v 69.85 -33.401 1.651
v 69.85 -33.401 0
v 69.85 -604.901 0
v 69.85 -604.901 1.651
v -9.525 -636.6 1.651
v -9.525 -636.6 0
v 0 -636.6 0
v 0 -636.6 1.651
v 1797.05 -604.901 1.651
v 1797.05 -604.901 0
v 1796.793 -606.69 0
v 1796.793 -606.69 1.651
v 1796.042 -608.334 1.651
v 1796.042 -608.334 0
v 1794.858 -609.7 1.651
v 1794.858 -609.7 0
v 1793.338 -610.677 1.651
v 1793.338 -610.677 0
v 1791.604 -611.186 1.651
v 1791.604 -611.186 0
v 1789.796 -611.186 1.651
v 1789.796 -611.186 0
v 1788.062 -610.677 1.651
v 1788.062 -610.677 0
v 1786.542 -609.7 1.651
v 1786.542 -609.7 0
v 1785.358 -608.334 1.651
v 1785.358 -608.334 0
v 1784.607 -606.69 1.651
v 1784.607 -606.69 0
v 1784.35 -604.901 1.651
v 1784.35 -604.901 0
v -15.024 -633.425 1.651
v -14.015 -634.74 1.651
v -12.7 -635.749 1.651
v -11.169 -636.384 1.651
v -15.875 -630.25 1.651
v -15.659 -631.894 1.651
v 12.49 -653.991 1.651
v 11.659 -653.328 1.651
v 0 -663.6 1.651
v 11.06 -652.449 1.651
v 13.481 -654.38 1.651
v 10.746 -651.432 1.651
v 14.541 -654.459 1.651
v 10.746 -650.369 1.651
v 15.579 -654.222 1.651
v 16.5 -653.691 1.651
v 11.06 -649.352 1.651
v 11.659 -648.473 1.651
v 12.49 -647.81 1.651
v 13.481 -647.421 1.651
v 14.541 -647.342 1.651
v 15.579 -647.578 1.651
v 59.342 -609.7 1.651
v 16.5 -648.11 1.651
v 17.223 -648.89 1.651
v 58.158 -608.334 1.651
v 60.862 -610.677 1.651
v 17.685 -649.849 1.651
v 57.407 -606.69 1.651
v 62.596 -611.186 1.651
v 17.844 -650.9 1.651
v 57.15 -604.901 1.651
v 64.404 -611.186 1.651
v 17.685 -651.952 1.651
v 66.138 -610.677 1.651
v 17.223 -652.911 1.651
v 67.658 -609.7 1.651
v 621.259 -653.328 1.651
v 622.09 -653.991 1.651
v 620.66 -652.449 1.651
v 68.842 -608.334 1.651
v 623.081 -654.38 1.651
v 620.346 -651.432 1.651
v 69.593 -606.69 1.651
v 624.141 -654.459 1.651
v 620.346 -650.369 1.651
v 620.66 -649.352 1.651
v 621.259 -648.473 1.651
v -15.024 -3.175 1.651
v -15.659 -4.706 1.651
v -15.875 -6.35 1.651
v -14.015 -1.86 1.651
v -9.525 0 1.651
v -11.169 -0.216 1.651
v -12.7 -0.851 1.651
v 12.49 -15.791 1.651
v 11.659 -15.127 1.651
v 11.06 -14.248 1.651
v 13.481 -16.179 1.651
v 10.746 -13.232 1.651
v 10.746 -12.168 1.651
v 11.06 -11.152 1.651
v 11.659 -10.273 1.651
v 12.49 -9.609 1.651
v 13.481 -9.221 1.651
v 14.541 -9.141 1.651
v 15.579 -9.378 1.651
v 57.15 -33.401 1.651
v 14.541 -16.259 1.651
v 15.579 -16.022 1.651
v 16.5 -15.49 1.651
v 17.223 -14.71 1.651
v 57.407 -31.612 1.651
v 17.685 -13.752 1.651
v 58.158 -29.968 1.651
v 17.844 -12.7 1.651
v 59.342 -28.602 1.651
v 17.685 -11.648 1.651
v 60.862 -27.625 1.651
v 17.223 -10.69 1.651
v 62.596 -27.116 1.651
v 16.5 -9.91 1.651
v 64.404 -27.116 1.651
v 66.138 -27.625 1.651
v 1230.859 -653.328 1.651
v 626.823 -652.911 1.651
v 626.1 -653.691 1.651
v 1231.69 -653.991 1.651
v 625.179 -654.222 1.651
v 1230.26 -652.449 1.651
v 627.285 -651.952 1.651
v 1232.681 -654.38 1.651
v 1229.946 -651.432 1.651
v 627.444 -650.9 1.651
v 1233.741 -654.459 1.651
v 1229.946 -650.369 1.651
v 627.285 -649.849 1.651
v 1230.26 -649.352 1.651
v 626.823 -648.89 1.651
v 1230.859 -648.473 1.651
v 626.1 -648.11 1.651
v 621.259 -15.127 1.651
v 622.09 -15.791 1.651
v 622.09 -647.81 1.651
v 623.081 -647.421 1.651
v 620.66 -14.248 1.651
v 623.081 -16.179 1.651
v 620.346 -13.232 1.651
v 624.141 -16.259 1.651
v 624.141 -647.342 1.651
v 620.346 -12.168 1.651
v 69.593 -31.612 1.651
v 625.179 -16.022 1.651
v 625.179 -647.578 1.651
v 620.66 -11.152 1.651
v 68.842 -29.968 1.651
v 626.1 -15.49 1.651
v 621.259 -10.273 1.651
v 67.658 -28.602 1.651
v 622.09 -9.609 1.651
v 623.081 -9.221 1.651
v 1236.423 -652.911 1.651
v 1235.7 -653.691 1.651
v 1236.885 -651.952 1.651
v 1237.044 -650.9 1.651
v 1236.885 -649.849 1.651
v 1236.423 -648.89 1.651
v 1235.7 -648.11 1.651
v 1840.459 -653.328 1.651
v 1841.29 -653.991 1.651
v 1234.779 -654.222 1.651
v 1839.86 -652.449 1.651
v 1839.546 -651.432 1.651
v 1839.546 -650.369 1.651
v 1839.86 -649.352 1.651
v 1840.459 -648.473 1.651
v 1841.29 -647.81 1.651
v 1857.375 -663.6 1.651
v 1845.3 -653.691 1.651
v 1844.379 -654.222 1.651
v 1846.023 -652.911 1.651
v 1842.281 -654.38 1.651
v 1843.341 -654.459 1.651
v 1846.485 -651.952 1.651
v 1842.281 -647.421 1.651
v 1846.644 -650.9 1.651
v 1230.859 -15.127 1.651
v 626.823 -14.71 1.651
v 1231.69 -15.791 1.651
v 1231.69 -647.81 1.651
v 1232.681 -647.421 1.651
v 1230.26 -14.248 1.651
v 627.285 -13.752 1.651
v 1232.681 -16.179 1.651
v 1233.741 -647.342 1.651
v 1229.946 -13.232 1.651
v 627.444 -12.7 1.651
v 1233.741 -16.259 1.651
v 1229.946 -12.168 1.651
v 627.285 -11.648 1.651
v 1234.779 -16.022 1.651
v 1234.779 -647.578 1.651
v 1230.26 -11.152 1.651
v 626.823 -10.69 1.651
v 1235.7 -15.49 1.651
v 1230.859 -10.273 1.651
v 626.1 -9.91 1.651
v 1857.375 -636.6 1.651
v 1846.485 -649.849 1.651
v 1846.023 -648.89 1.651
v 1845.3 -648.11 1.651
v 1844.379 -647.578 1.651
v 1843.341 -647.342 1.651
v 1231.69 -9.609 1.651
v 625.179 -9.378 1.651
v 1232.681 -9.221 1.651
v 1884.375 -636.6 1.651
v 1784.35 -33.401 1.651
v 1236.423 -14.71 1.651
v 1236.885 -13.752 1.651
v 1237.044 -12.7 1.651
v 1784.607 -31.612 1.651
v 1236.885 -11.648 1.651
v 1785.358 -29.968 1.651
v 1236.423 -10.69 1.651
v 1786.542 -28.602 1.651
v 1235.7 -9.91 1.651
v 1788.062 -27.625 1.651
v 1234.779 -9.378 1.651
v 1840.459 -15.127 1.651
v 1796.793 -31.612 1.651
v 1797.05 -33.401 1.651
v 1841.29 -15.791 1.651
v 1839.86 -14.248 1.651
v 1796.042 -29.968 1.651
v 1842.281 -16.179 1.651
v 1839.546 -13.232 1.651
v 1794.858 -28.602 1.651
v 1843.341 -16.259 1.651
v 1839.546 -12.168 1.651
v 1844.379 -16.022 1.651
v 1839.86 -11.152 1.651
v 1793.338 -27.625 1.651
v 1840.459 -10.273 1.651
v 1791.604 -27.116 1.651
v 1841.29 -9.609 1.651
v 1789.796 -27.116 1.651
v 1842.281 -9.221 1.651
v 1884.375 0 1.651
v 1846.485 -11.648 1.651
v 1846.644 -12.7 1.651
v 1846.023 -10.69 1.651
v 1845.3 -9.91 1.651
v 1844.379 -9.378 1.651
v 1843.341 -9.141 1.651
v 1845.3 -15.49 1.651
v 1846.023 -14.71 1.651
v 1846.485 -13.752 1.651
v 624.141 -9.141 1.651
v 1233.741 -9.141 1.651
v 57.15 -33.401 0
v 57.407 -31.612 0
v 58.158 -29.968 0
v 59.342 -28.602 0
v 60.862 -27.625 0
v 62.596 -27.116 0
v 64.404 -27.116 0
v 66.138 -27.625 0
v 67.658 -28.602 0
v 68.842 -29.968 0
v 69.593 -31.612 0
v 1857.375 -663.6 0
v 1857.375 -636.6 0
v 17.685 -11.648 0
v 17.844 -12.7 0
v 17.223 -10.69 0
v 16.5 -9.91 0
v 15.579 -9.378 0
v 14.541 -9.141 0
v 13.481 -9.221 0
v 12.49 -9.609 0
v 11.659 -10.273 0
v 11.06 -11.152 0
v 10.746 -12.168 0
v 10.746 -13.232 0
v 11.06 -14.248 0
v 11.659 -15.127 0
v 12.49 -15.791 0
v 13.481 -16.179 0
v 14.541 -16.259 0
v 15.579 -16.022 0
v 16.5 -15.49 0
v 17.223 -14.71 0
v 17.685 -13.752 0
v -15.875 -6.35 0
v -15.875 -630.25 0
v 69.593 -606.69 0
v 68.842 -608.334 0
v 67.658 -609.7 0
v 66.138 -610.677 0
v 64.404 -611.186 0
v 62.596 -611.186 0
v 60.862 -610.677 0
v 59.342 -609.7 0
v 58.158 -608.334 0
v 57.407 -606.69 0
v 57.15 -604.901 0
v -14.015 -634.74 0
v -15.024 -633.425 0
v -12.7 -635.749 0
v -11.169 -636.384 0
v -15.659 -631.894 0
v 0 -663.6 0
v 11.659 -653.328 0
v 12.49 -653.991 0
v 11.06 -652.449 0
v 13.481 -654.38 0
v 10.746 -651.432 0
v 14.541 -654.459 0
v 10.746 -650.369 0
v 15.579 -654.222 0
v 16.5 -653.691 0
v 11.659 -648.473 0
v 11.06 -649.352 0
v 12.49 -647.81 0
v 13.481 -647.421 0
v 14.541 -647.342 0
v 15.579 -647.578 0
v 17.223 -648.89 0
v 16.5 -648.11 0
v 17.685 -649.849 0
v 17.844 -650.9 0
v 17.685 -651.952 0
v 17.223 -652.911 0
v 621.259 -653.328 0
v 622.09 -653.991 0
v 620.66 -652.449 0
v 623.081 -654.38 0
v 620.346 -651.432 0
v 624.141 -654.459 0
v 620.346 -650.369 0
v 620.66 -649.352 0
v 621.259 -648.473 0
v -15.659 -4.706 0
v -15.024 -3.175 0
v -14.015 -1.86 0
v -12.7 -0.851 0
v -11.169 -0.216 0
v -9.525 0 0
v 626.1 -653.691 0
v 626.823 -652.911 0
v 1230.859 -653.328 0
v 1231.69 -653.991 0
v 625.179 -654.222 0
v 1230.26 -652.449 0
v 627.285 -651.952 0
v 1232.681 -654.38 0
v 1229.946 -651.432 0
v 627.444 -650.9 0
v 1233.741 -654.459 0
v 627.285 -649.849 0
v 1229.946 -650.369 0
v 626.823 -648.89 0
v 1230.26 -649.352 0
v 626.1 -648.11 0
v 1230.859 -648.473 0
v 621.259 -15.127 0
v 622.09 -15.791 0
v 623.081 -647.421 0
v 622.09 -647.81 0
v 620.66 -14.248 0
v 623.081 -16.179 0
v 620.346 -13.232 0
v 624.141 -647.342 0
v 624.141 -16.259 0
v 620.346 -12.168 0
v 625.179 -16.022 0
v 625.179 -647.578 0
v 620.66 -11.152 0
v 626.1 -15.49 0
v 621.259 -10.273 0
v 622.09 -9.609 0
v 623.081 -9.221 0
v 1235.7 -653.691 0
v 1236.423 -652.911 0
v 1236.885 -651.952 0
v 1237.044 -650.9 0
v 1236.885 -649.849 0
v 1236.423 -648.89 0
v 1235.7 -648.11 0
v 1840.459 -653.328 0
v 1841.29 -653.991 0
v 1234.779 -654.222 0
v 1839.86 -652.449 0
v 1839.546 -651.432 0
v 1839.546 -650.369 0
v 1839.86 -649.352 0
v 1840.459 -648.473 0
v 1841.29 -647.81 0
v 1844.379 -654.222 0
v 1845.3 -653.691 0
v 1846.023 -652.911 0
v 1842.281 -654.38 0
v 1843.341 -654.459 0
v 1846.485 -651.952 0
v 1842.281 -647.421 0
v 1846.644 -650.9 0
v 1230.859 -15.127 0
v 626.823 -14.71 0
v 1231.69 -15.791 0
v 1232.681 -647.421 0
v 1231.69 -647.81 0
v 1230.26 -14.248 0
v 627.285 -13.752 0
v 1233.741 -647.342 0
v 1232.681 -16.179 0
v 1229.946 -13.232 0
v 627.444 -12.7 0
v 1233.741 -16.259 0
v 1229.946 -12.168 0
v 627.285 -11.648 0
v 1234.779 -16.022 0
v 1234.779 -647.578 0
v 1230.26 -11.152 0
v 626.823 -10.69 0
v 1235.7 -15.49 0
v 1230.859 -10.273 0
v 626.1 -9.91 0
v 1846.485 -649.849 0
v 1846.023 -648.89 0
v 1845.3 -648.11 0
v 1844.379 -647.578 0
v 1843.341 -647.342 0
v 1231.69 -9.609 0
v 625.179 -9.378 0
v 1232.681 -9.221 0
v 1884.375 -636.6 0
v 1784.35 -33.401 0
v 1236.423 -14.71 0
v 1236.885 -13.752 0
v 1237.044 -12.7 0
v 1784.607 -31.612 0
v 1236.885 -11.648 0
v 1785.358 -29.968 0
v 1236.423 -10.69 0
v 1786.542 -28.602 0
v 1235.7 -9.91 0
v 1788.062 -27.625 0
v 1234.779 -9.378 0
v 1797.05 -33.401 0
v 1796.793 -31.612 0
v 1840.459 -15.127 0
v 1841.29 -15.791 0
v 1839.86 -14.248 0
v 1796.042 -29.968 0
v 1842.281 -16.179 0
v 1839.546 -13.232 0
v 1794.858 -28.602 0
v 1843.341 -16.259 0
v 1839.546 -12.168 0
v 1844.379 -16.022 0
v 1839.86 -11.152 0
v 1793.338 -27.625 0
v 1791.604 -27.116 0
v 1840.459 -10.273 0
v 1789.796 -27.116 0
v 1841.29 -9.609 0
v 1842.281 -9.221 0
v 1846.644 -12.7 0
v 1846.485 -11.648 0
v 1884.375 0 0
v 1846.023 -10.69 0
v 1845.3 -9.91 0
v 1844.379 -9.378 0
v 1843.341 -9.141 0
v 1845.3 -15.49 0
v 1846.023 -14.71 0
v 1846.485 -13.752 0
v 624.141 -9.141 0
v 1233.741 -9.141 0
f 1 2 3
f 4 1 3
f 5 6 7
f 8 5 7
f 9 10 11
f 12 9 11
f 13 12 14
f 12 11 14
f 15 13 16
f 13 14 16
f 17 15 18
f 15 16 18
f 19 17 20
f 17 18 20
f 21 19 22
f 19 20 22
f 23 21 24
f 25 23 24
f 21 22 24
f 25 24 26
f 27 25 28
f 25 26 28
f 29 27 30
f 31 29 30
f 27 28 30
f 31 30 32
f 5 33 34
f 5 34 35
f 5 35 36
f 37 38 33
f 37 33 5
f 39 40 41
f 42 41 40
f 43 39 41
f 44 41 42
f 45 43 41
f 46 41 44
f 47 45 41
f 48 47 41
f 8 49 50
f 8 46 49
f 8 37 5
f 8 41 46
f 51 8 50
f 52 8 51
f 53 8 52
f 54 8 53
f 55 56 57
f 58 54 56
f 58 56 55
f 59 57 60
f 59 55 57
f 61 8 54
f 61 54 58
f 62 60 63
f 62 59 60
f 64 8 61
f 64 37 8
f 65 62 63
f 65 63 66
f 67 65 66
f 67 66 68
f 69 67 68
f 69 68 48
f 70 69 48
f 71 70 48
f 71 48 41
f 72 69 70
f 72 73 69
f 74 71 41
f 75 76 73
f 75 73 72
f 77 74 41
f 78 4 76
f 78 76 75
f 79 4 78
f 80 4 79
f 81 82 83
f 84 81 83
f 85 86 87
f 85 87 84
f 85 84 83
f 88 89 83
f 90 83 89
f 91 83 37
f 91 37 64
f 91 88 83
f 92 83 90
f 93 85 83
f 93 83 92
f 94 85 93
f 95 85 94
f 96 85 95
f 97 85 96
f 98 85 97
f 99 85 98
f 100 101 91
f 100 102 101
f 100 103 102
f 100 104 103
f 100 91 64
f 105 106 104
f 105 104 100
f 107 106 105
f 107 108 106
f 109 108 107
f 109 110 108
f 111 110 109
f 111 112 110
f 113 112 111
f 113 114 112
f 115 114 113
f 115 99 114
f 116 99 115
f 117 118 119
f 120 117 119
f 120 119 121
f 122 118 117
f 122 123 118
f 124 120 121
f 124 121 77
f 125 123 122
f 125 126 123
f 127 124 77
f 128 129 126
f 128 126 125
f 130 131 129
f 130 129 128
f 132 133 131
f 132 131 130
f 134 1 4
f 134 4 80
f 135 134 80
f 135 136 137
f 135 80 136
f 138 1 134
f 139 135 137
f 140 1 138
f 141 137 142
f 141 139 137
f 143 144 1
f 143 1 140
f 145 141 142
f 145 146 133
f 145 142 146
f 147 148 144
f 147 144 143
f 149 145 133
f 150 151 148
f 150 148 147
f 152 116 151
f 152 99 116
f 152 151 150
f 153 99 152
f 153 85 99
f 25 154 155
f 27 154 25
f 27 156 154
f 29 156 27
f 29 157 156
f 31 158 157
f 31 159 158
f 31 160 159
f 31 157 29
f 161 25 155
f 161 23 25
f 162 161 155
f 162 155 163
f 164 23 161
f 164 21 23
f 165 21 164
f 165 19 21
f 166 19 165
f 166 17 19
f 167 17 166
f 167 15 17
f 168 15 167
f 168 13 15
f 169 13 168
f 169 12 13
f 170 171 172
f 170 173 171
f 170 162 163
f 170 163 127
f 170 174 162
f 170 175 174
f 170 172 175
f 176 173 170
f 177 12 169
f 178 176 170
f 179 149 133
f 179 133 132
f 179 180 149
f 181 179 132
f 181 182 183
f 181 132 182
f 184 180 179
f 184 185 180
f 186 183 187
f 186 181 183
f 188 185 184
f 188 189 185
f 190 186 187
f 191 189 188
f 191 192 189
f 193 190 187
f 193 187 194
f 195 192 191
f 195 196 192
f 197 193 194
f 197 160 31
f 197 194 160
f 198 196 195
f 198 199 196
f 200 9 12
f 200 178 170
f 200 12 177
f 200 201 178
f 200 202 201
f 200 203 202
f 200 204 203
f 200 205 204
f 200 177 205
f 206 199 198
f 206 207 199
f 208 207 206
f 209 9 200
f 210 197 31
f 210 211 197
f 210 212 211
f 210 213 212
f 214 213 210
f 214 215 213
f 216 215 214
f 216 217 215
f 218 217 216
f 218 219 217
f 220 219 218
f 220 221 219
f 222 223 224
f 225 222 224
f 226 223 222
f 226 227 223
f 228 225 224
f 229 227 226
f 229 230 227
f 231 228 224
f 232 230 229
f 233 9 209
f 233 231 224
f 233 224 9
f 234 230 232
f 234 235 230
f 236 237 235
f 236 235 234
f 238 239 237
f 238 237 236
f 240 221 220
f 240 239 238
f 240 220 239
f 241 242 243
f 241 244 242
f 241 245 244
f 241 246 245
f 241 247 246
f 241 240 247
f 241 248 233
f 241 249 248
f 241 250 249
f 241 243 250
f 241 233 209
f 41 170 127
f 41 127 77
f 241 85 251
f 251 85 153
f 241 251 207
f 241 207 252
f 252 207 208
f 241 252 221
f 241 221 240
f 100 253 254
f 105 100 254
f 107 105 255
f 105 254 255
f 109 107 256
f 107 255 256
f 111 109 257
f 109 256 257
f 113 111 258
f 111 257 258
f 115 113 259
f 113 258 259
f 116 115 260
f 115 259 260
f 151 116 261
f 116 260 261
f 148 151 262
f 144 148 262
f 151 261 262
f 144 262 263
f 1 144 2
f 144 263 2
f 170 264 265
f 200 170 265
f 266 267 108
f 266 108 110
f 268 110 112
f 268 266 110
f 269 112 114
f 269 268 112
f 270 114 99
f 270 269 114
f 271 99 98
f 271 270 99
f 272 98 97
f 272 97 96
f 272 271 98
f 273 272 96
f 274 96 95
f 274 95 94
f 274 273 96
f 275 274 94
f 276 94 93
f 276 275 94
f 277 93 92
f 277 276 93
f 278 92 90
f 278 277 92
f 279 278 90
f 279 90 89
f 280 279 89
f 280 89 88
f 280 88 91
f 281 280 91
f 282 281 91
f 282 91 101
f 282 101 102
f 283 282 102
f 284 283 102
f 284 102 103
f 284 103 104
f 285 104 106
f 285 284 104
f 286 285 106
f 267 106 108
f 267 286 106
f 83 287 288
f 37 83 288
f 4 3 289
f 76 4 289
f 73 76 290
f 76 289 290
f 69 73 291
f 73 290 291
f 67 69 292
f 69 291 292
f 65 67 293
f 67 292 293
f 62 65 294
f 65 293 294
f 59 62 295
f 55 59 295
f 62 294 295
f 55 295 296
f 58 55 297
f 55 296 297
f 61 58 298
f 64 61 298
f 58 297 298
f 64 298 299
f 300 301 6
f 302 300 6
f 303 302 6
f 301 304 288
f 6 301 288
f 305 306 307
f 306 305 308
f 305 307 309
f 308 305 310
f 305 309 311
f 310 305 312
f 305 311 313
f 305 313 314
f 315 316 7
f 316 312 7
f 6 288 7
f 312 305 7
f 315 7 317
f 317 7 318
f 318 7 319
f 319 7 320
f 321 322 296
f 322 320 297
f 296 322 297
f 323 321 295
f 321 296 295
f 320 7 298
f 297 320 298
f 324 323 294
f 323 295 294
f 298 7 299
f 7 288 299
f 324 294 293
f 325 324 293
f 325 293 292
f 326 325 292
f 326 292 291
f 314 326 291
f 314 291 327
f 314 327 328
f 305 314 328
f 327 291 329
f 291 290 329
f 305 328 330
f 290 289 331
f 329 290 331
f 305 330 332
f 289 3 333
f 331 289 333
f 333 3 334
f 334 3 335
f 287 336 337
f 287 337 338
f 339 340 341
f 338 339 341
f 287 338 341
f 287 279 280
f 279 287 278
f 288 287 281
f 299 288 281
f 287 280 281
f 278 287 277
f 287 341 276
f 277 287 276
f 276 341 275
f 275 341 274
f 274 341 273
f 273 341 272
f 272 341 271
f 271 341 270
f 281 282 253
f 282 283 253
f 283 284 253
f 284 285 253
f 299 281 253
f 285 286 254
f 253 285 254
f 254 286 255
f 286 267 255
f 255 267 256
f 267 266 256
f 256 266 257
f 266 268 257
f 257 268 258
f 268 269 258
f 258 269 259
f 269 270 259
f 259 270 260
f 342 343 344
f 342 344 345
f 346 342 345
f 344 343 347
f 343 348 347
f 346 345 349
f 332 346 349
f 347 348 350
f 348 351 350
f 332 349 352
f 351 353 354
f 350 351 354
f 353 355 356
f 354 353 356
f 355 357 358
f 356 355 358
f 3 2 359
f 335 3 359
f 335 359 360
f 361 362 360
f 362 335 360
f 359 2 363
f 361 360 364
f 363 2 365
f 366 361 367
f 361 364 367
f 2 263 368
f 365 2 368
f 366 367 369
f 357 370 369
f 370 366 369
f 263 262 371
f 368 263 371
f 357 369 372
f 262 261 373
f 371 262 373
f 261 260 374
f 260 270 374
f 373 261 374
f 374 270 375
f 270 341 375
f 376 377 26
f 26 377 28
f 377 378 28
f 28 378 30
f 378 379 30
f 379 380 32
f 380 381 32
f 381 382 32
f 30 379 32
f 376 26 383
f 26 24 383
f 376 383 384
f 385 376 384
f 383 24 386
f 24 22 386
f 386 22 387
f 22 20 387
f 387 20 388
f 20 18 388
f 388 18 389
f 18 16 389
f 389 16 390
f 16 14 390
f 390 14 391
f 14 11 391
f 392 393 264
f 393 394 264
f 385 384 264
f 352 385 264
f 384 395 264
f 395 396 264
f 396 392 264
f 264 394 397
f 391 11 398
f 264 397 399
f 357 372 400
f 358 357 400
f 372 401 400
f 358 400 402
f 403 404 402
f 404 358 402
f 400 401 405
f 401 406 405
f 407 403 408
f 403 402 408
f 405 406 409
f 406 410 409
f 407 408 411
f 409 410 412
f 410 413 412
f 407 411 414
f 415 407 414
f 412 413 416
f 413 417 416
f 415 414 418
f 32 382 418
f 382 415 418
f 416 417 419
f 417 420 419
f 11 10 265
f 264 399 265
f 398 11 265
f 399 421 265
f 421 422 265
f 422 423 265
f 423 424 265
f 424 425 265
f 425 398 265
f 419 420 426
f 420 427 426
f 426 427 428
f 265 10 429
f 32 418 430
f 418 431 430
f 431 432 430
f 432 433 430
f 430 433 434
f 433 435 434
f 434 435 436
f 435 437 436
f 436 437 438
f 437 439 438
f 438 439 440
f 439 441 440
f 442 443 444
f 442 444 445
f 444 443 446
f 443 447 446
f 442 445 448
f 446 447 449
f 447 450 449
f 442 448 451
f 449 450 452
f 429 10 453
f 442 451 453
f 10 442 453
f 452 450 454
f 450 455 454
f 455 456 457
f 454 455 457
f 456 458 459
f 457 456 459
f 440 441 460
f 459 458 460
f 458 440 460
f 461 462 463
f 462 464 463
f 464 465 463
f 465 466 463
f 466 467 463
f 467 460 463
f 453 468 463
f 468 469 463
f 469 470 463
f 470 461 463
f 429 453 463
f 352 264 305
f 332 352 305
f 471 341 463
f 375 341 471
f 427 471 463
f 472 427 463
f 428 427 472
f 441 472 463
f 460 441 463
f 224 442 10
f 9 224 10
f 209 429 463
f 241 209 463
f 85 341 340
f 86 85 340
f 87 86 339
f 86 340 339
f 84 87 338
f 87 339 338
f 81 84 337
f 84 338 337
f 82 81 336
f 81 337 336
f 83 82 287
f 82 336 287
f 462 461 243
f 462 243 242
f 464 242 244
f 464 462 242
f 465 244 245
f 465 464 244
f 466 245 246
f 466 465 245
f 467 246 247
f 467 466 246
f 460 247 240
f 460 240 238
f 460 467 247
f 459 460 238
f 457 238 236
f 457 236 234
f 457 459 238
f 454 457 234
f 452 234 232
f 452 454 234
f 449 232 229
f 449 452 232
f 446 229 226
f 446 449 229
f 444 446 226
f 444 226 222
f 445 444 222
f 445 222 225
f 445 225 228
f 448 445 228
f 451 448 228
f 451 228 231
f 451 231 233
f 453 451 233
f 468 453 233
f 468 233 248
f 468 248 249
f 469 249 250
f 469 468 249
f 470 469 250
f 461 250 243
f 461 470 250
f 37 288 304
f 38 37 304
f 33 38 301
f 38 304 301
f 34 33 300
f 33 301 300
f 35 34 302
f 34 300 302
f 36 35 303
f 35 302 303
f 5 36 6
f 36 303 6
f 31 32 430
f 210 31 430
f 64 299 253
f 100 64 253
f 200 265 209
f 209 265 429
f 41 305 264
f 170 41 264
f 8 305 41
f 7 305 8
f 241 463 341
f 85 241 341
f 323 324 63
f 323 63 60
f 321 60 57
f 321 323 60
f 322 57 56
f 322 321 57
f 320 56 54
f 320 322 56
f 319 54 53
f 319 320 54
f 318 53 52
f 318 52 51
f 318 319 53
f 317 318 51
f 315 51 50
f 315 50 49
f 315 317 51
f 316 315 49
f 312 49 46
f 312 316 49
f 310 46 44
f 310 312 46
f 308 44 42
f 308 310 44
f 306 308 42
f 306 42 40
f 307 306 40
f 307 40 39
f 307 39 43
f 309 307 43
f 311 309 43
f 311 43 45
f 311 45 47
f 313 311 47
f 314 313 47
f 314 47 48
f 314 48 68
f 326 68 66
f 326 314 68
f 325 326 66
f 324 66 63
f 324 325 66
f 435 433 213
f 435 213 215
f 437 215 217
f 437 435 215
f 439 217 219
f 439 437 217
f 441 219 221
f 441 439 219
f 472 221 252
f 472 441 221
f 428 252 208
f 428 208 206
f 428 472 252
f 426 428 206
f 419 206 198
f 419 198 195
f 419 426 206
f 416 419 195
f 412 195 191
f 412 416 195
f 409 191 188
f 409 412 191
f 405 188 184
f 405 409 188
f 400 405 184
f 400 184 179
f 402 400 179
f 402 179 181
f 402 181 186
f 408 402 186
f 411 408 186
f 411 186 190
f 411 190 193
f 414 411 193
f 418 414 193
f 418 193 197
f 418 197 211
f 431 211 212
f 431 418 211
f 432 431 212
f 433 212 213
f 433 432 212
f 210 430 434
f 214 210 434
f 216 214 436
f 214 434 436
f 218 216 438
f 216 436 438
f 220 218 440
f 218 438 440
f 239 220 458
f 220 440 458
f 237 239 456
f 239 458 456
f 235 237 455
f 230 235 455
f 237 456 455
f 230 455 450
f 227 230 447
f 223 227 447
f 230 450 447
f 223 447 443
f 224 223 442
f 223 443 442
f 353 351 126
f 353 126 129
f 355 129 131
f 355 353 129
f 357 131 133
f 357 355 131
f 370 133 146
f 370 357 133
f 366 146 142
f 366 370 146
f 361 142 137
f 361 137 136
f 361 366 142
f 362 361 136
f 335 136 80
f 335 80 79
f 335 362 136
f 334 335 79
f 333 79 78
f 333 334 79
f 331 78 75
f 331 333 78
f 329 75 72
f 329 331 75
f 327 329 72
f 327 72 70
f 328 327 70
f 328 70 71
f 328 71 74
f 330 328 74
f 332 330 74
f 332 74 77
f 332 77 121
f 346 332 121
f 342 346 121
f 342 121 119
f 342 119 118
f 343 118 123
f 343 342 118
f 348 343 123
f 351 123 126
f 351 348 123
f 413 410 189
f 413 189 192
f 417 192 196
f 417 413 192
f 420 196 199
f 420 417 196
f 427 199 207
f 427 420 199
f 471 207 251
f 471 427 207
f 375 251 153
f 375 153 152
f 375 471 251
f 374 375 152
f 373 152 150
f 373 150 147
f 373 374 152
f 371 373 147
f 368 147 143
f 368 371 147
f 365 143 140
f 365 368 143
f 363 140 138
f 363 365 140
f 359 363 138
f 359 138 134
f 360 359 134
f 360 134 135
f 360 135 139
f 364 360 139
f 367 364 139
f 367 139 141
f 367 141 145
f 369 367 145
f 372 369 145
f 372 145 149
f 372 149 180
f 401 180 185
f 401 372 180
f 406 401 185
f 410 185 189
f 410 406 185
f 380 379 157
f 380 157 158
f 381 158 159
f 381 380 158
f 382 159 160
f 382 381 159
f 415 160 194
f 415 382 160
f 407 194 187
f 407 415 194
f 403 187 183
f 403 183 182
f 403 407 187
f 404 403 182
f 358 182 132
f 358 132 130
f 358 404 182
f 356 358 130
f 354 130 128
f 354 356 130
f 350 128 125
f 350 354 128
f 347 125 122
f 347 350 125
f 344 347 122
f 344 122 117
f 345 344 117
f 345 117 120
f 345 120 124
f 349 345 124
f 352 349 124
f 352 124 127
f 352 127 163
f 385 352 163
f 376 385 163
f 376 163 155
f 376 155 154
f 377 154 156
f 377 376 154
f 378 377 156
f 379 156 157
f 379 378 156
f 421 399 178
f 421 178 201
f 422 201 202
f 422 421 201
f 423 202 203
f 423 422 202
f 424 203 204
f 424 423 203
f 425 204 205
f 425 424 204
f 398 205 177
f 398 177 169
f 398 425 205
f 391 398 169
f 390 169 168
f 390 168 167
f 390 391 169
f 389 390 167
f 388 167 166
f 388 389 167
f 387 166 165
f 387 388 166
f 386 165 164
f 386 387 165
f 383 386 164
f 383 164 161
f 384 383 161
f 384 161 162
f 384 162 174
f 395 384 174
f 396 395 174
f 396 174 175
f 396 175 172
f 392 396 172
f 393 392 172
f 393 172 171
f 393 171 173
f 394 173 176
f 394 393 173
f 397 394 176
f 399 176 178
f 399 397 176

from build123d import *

# Parameters (mm, degrees)
F0_W     = 1857.375
F0_H     = 636.6002
F0_R     = 3.5687
F0_H_2   = 27.0002
F0_W_2   = 27.0002
F1_DEPTH = 1.651


with BuildPart() as f1:
    # F0 (on Top) → F1 (new body)
    with BuildSketch(Plane.XY):
        with BuildLine():
            Line((0, -636.6002), (0, 0))
            Line((0, 0), (-9.525, 0))
            ThreePointArc((-9.525, 0), (-14.015128, -1.859872), (-15.875, -6.35))
            Line((-15.875, -6.35), (-15.875, -630.2502))
            ThreePointArc((-15.875, -630.2502), (-14.015128, -634.740328), (-9.525, -636.6002))
            Line((-9.525, -636.6002), (0, -636.6002))
        make_face()
        with Locations((928.6875, -318.3001)):
            Rectangle(F0_W, F0_H)
        with BuildLine():
            ThreePointArc((57.15, -33.401), (63.5, -27.051), (69.85, -33.401))
            Line((69.85, -33.401), (69.85, -604.901))
            ThreePointArc((69.85, -604.901), (63.5, -611.251), (57.15, -604.901))
            Line((57.15, -604.901), (57.15, -33.401))
        make_face(mode=Mode.SUBTRACT)
        with Locations((14.2748, -12.7)):
            Circle(F0_R, mode=Mode.SUBTRACT)
        with Locations((623.8748, -12.7)):
            Circle(F0_R, mode=Mode.SUBTRACT)
        with BuildLine():
            ThreePointArc((1784.35, -33.401), (1790.7, -27.051), (1797.05, -33.401))
            Line((1797.05, -33.401), (1797.05, -604.901))
            ThreePointArc((1797.05, -604.901), (1790.7, -611.251), (1784.35, -604.901))
            Line((1784.35, -604.901), (1784.35, -33.401))
        make_face(mode=Mode.SUBTRACT)
        with Locations((1233.4748, -12.7)):
            Circle(F0_R, mode=Mode.SUBTRACT)
        with Locations((1843.0748, -12.7)):
            Circle(F0_R, mode=Mode.SUBTRACT)
        with Locations((928.6875, -650.1003)):
            Rectangle(F0_W, F0_H_2)
        with Locations((14.2748, -650.9004)):
            Circle(F0_R, mode=Mode.SUBTRACT)
        with Locations((623.8748, -650.9004)):
            Circle(F0_R, mode=Mode.SUBTRACT)
        with Locations((1233.4748, -650.9004)):
            Circle(F0_R, mode=Mode.SUBTRACT)
        with Locations((1843.0748, -650.9004)):
            Circle(F0_R, mode=Mode.SUBTRACT)
        with Locations((1870.8751, -318.3001)):
            Rectangle(F0_W_2, F0_H)
    extrude(amount=F1_DEPTH)


solid = f1.part
